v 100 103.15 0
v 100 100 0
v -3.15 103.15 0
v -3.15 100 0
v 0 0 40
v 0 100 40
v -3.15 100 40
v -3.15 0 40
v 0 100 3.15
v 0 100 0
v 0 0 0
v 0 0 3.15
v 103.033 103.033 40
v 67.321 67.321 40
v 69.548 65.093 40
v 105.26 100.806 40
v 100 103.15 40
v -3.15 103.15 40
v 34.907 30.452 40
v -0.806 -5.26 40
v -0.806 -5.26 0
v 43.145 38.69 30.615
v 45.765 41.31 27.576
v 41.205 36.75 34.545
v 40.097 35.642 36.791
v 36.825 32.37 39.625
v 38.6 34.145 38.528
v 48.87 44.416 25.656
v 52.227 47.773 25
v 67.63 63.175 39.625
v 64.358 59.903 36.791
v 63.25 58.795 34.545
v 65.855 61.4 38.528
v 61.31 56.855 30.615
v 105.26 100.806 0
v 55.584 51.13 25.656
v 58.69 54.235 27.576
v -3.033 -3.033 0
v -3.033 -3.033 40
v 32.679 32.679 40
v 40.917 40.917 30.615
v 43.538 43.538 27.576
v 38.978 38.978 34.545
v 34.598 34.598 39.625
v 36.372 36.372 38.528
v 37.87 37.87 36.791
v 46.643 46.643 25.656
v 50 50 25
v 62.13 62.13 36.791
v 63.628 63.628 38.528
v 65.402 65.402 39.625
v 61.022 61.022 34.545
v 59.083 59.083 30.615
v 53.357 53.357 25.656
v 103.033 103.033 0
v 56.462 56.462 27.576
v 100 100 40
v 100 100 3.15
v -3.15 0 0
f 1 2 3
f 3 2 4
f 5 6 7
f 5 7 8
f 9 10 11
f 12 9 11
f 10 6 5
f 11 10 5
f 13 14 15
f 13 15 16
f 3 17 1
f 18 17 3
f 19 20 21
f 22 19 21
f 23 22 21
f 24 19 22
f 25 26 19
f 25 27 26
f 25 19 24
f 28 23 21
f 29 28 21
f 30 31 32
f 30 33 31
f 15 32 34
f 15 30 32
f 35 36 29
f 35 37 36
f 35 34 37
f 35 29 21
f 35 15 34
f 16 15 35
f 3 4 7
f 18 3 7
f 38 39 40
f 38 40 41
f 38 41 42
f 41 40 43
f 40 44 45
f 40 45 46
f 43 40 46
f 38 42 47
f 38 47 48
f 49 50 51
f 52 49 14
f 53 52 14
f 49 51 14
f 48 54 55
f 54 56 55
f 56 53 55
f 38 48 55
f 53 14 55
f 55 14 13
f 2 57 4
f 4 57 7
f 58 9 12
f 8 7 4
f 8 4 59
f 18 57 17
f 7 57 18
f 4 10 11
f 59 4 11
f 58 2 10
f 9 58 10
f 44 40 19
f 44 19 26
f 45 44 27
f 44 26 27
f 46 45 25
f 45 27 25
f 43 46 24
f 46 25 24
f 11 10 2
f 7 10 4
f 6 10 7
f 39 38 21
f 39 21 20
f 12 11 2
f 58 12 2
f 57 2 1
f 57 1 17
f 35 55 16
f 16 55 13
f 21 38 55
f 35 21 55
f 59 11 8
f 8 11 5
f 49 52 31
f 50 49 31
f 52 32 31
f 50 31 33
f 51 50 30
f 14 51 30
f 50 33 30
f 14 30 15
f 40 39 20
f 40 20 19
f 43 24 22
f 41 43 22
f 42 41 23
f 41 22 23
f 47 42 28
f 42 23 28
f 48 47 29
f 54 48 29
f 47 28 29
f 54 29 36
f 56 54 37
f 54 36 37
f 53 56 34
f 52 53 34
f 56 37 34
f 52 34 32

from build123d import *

# Parameters (mm, degrees)
F2_DEPTH  = 3.15
F3_W      = 100
F3_H      = 40
F4_DEPTH  = 3.15
F5_W      = 103.15
F5_H      = 40
F6_DEPTH  = 3.15
F7_W      = 150
F7_H      = 40
F8_DEPTH  = 3.15
F9_R      = 17.5
F10_DEPTH = 25
F11_R     = 10


with BuildPart() as f2:
    # F1 (on Top) → F2 (new body)
    with BuildSketch(Plane.XY):
        Polygon((0, 100), (0, 0), (100, 100), align=None)
    extrude(amount=F2_DEPTH)


with BuildPart() as f4:
    # F3 (on face) → F4 (new body)
    with BuildSketch(Plane(origin=(0, 0, 0), x_dir=(0, -1, 0), z_dir=(-1, 0, 0))):
        with Locations((-50, 20)):
            Rectangle(F3_W, F3_H)
    extrude(amount=F4_DEPTH)


with BuildPart() as f6:
    # F5 (on face) → F6 (new body)
    with BuildSketch(Plane(origin=(0, 100, 0), x_dir=(-1, 0, 0), z_dir=(0, 1, 0))):
        with Locations((-48.425, 20)):
            Rectangle(F5_W, F5_H)
    extrude(amount=F6_DEPTH)


with BuildPart() as f8:
    # F7 (on face) → F8 (new body)
    with BuildSketch(Plane(origin=(0, 0, 0), x_dir=(0.7071067812, 0.7071067812, 0), z_dir=(0.7071067812, -0.7071067812, 0))):
        with Locations((70.7106781187, 20)):
            Rectangle(F7_W, F7_H)
    extrude(amount=F8_DEPTH)

    # F9 (on face) → F10 (cut)
    with BuildSketch(Plane(origin=(2.2273863607, -2.2273863607, 0), x_dir=(0.7071067812, 0.7071067812, 0), z_dir=(0.7071067812, -0.7071067812, 0))):
        with Locations((70.7106781187, 42.5)):
            Circle(F9_R)
    extrude(amount=-F10_DEPTH, mode=Mode.SUBTRACT)

    # F11
    f11_edges = [f8.edges().sort_by_distance(p)[0] for p in [
        (63.361142, 61.133756, 40),
        (38.866244, 36.638858, 40),
    ]]
    fillet(f11_edges, radius=F11_R)


solid = Compound([f2.part, f4.part, f6.part, f8.part])
